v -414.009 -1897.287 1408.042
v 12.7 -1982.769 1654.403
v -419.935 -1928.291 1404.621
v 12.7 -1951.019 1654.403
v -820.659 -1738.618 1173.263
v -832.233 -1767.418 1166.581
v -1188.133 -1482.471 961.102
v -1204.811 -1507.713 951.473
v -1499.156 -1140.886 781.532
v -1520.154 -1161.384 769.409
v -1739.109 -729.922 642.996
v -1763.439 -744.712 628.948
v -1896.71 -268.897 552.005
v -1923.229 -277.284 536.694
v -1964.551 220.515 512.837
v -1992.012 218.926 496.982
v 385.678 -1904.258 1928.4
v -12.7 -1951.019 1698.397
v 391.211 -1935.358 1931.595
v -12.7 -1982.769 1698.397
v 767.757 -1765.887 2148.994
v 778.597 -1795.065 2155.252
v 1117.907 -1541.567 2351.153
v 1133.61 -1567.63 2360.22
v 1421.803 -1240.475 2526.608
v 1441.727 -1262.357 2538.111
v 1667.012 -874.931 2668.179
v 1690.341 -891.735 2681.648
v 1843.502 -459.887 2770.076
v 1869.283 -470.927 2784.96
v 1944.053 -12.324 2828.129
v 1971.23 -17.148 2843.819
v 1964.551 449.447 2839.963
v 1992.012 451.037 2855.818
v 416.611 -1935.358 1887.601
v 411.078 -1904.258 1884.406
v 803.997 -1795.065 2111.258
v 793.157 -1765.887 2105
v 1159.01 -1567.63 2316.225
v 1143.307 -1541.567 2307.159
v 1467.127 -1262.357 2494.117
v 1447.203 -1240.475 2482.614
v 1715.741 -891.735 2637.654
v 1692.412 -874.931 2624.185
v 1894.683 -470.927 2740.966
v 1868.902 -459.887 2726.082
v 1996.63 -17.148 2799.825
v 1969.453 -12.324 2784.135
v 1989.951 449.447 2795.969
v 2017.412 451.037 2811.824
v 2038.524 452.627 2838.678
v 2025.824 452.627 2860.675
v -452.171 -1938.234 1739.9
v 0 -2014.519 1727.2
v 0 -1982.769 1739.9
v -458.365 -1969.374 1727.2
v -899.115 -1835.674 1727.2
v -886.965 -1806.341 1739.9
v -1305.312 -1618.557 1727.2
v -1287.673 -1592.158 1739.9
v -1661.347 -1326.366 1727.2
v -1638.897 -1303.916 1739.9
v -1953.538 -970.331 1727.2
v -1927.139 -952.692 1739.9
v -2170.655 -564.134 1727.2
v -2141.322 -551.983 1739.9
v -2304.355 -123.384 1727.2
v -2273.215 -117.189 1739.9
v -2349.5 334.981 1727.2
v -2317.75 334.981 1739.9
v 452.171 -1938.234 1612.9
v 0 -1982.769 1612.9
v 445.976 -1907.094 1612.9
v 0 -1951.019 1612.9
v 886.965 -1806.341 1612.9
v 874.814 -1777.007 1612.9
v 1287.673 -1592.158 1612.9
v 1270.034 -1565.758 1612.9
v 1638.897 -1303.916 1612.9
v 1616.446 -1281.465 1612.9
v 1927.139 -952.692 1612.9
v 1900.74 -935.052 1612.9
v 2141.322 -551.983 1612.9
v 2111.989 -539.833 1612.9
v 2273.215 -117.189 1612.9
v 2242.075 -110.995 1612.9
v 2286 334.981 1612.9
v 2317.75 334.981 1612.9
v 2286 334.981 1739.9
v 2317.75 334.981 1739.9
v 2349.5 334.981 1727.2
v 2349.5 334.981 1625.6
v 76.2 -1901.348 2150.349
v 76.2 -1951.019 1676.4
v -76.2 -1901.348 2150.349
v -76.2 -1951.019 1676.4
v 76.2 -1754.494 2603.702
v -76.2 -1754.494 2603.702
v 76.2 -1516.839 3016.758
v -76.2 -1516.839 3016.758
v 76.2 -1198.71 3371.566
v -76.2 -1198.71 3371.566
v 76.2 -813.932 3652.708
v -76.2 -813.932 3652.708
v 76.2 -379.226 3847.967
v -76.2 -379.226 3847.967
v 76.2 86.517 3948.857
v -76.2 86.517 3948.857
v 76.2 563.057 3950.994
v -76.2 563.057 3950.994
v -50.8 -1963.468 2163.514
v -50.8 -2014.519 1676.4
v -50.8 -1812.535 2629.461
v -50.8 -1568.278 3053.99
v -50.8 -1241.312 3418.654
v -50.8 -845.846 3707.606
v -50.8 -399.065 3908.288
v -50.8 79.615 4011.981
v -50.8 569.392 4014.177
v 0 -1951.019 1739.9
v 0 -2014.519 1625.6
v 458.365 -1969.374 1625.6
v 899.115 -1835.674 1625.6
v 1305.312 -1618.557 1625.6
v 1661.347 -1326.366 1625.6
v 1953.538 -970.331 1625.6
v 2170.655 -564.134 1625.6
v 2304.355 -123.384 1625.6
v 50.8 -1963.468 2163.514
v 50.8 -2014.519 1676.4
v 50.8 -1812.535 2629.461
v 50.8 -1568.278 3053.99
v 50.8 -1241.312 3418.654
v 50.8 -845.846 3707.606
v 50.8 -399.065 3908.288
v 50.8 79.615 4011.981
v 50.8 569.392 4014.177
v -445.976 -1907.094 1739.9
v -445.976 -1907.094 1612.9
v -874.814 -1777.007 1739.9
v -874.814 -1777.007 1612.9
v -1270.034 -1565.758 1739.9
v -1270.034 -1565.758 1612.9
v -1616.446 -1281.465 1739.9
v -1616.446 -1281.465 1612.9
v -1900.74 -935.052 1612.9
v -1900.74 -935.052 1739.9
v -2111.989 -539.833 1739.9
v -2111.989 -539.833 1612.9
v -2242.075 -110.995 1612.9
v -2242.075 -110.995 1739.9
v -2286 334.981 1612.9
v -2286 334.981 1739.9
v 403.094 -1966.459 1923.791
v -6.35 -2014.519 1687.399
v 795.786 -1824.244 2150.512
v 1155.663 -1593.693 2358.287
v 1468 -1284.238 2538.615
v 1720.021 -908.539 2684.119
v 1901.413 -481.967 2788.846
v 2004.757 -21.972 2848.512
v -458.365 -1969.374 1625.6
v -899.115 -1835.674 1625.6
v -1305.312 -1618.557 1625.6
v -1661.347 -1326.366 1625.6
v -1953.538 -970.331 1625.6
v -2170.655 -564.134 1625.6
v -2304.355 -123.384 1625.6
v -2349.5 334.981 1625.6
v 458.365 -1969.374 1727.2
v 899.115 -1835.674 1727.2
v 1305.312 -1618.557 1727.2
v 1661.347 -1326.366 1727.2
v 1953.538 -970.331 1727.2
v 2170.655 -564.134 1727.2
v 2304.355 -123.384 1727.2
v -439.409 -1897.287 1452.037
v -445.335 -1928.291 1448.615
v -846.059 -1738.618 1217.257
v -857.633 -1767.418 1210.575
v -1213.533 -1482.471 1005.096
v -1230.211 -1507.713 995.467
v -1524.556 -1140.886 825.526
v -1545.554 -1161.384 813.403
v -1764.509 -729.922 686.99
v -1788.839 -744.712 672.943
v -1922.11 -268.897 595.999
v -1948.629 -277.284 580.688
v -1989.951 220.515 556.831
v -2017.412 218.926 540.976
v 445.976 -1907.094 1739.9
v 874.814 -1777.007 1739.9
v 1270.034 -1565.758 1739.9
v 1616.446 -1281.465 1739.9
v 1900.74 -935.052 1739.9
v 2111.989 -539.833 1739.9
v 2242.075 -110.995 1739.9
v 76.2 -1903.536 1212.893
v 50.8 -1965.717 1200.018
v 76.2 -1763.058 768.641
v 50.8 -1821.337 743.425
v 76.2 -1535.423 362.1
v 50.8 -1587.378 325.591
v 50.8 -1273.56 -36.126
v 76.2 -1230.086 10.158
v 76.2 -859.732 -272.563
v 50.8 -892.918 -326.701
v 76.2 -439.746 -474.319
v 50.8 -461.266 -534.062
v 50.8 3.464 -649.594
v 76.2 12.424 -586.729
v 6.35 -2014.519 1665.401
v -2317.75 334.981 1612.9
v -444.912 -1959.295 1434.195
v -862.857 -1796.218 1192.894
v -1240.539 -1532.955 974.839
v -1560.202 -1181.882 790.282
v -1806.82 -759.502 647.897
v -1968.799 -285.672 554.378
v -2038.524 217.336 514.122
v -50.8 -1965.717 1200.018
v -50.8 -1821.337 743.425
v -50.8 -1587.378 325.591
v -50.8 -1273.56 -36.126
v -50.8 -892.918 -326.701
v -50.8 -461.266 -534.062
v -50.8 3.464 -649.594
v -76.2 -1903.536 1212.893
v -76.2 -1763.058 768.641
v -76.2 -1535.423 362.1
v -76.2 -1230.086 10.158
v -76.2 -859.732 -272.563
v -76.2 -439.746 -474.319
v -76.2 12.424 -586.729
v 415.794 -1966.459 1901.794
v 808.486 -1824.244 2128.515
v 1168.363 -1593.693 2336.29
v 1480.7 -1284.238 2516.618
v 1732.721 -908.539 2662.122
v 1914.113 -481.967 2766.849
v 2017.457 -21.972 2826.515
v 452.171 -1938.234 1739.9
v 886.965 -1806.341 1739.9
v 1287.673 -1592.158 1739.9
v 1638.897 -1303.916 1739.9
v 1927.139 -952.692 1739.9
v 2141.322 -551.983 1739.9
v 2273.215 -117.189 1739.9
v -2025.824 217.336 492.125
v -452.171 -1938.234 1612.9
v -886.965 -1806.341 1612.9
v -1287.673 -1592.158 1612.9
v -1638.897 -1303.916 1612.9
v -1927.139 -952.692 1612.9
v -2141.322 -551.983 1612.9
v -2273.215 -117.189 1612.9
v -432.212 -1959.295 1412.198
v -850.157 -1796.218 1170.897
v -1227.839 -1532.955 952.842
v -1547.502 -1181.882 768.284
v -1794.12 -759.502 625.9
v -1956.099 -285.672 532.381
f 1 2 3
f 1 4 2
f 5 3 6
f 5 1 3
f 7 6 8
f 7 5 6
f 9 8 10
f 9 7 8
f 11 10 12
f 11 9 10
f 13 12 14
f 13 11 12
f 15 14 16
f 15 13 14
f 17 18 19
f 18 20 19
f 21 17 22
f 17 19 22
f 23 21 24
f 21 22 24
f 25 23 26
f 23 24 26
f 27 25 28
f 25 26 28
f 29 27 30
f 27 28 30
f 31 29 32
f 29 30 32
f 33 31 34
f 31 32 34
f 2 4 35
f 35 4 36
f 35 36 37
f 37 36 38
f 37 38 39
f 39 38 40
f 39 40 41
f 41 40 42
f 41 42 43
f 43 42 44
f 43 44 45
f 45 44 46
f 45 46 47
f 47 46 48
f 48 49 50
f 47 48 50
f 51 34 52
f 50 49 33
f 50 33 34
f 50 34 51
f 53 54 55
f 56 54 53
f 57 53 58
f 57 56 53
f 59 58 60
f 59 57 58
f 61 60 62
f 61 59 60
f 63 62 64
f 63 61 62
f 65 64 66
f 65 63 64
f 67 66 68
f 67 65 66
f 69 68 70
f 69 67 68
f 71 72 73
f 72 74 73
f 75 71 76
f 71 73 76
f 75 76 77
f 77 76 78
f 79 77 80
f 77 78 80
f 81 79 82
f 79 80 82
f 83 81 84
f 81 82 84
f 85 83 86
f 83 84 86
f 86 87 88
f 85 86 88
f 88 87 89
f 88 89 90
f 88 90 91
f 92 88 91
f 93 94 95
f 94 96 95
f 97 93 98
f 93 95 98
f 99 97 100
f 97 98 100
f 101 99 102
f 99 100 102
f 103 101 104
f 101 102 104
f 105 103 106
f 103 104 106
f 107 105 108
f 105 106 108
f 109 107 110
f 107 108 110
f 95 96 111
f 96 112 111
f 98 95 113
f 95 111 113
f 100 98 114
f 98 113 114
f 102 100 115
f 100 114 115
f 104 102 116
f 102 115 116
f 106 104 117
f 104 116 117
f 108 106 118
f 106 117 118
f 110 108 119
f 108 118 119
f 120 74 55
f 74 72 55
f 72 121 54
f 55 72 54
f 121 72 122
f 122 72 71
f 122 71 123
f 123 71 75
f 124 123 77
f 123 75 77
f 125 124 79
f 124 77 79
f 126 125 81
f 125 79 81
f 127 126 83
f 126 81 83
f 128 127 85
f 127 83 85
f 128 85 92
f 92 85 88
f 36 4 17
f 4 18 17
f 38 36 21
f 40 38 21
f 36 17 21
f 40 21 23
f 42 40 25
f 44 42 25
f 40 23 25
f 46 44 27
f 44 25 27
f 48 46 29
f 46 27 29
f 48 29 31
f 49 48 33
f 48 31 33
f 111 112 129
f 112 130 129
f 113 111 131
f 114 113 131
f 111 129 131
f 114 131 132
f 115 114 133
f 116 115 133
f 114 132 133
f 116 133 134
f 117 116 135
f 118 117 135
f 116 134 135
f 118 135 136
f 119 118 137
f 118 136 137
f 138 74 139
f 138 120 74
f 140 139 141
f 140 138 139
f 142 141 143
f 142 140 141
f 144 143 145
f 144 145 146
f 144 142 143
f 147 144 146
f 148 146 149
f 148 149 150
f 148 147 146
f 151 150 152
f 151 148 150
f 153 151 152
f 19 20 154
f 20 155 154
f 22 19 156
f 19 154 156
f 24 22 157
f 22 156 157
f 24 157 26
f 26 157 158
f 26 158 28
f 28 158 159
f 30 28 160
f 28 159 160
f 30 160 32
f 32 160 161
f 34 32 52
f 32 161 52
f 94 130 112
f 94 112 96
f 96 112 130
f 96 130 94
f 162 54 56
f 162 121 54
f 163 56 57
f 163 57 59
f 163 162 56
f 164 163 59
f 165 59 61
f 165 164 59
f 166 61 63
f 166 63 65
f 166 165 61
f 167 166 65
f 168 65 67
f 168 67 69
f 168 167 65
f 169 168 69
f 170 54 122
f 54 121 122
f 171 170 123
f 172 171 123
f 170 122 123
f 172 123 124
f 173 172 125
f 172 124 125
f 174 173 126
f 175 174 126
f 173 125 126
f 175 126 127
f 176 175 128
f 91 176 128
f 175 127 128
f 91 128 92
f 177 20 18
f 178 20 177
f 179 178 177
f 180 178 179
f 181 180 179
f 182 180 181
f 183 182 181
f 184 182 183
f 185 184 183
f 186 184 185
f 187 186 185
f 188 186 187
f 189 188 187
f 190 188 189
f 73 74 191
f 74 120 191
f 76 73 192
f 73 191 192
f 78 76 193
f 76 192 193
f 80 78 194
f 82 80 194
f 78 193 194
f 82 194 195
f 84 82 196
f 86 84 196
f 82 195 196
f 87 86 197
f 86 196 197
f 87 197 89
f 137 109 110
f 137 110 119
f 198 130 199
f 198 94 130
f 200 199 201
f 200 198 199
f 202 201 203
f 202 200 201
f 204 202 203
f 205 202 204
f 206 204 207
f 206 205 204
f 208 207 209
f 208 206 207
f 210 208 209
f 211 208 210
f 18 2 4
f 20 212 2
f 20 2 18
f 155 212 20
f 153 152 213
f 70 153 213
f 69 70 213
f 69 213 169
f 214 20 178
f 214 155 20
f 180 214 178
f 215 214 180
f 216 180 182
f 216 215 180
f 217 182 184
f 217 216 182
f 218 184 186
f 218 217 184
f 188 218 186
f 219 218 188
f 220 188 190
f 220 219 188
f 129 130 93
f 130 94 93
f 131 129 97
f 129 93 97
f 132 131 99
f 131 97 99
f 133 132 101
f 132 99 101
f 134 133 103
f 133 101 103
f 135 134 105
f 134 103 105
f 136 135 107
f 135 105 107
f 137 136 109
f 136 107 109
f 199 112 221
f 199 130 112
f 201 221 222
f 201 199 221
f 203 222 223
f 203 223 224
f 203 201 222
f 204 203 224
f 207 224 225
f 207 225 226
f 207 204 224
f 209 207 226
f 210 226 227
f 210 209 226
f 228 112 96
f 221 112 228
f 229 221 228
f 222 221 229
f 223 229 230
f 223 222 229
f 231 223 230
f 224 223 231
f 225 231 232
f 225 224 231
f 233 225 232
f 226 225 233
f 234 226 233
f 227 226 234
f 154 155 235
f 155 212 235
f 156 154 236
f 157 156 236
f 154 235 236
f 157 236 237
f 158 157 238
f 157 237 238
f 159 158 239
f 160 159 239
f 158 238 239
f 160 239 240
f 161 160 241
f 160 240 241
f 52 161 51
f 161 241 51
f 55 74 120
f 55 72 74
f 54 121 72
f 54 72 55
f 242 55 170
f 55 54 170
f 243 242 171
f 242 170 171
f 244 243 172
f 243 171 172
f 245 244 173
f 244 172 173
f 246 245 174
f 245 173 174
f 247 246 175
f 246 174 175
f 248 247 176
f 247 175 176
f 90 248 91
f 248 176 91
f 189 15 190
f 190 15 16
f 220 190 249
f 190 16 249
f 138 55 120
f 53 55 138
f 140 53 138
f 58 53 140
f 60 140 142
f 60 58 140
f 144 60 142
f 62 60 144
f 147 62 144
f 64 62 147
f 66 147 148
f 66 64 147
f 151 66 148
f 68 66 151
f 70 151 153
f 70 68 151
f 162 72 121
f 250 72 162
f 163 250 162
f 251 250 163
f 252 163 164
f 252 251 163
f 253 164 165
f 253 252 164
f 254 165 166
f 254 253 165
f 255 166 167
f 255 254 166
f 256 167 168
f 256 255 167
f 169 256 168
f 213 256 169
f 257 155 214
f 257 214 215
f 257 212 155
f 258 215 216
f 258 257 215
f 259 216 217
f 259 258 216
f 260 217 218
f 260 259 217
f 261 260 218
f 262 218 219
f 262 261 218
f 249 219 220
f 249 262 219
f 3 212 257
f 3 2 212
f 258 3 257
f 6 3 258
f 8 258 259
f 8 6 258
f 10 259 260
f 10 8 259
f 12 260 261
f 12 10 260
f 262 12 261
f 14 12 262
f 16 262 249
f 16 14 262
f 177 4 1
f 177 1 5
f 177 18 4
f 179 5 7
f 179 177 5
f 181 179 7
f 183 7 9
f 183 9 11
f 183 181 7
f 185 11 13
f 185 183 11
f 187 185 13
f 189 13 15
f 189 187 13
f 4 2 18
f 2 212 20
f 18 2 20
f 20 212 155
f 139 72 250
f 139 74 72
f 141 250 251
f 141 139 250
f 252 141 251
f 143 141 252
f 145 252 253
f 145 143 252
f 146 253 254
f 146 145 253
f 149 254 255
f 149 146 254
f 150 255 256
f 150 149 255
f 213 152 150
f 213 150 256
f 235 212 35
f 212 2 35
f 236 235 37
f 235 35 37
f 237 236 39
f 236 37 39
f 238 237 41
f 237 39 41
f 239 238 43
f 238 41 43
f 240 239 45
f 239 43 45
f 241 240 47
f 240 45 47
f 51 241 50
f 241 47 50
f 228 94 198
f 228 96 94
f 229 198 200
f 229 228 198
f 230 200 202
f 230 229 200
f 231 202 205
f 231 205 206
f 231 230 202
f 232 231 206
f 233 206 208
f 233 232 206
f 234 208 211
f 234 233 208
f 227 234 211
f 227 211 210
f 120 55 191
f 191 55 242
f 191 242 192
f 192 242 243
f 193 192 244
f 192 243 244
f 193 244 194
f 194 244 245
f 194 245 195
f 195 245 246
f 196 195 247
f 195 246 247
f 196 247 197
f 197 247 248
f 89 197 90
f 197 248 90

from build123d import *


with BuildPart() as f4:
    # F4: sweep along a path in F3
    with BuildLine(Plane.YZ) as f4_path:
        ThreePointArc((-1951.0188522569, 1676.4), (-1198.7097344299, 3371.5661505408), (563.0566315046, 3950.9939360042))
    # F2 (on line) → F4 (sweep)
    with BuildSketch(Plane.XY.offset(1676.4)):
        Polygon((76.2, -1951.0188522569), (-76.2, -1951.0188522569), (-50.8, -2014.5188522569), (0, -2014.5188522569), (50.8, -2014.5188522569), align=None)
    sweep(path=f4_path.line)


with BuildPart() as f5:
    # F5: sweep along a path in F3
    with BuildLine(Plane.YZ) as f5_path:
        ThreePointArc((-1951.0188522569, 1676.4), (-1391.7442605118, 178.329452767), (12.4241612926, -586.729026479))
    # F2 (on line) → F5 (sweep)
    with BuildSketch(Plane.XY.offset(1676.4)):
        Polygon((76.2, -1951.0188522569), (-76.2, -1951.0188522569), (-50.8, -2014.5188522569), (0, -2014.5188522569), (50.8, -2014.5188522569), align=None)
    sweep(path=f5_path.line)


with BuildPart() as f9:
    # F9: sweep along a path in F6
    with BuildLine(Plane.XY.offset(1676.4)) as f9_path:
        ThreePointArc((0, -1951.0188522569), (1616.4461017924, -1281.4649540494), (2286, 334.9811477431))
    # F8 (on line) → F9 (sweep)
    with BuildSketch(Plane.YZ):
        Polygon((-1951.0188522569, 1612.9), (-1951.0188522569, 1739.9), (-1982.7688522569, 1739.9), (-2014.5188522569, 1727.2), (-2014.5188522569, 1625.6), (-1982.7688522569, 1612.9), align=None)
    sweep(path=f9_path.line)


with BuildPart() as f10:
    # F10: sweep along a path in F6
    with BuildLine(Plane.XY.offset(1676.4)) as f10_path:
        ThreePointArc((0, -1951.0188522569), (-1616.4461017924, -1281.4649540494), (-2286, 334.9811477431))
    # F8 (on line) → F10 (sweep)
    with BuildSketch(Plane.YZ):
        Polygon((-1951.0188522569, 1612.9), (-1951.0188522569, 1739.9), (-1982.7688522569, 1739.9), (-2014.5188522569, 1727.2), (-2014.5188522569, 1625.6), (-1982.7688522569, 1612.9), align=None)
    sweep(path=f10_path.line)


with BuildPart() as f16:
    # F16: sweep along a path in F13
    with BuildLine(Plane(origin=(-725.9024934521, 0, 1257.3), x_dir=(0.8660254038, 0, 0.5), z_dir=(0.5, 0, -0.8660254038))) as f16_path:
        ThreePointArc((838.2, 1951.0188522569), (2494.621575006, 1240.4754736383), (3121.332404324, -449.4469693927))
    # F15 (on line) → F16 (sweep)
    with BuildSketch(Plane(origin=(725.9024934521, 0, 419.1), x_dir=(0, 1, 0), z_dir=(0.8660254038, 0, 0.5))):
        Polygon((-1951.0188522569, 1426.4049869042), (-1951.0188522569, 1477.2049869042), (-1982.7688522569, 1477.2049869042), (-2014.5188522569, 1464.5049869042), (-2014.5188522569, 1439.1049869042), (-1982.7688522569, 1426.4049869042), align=None)
    sweep(path=f16_path.line)


with BuildPart() as f17:
    # F17: sweep along a path in F13
    with BuildLine(Plane(origin=(-725.9024934521, 0, 1257.3), x_dir=(0.8660254038, 0, 0.5), z_dir=(0.5, 0, -0.8660254038))) as f17_path:
        ThreePointArc((838.2, 1951.0188522569), (-737.2566213814, 1321.440427263), (-1444.932404324, -220.5153260935))
    # F15 (on line) → F17 (sweep)
    with BuildSketch(Plane(origin=(725.9024934521, 0, 419.1), x_dir=(0, 1, 0), z_dir=(0.8660254038, 0, 0.5))):
        Polygon((-1951.0188522569, 1426.4049869042), (-1951.0188522569, 1477.2049869042), (-1982.7688522569, 1477.2049869042), (-2014.5188522569, 1464.5049869042), (-2014.5188522569, 1439.1049869042), (-1982.7688522569, 1426.4049869042), align=None)
    sweep(path=f17_path.line)


solid = Compound([f4.part, f5.part, f9.part, f10.part, f16.part, f17.part])
